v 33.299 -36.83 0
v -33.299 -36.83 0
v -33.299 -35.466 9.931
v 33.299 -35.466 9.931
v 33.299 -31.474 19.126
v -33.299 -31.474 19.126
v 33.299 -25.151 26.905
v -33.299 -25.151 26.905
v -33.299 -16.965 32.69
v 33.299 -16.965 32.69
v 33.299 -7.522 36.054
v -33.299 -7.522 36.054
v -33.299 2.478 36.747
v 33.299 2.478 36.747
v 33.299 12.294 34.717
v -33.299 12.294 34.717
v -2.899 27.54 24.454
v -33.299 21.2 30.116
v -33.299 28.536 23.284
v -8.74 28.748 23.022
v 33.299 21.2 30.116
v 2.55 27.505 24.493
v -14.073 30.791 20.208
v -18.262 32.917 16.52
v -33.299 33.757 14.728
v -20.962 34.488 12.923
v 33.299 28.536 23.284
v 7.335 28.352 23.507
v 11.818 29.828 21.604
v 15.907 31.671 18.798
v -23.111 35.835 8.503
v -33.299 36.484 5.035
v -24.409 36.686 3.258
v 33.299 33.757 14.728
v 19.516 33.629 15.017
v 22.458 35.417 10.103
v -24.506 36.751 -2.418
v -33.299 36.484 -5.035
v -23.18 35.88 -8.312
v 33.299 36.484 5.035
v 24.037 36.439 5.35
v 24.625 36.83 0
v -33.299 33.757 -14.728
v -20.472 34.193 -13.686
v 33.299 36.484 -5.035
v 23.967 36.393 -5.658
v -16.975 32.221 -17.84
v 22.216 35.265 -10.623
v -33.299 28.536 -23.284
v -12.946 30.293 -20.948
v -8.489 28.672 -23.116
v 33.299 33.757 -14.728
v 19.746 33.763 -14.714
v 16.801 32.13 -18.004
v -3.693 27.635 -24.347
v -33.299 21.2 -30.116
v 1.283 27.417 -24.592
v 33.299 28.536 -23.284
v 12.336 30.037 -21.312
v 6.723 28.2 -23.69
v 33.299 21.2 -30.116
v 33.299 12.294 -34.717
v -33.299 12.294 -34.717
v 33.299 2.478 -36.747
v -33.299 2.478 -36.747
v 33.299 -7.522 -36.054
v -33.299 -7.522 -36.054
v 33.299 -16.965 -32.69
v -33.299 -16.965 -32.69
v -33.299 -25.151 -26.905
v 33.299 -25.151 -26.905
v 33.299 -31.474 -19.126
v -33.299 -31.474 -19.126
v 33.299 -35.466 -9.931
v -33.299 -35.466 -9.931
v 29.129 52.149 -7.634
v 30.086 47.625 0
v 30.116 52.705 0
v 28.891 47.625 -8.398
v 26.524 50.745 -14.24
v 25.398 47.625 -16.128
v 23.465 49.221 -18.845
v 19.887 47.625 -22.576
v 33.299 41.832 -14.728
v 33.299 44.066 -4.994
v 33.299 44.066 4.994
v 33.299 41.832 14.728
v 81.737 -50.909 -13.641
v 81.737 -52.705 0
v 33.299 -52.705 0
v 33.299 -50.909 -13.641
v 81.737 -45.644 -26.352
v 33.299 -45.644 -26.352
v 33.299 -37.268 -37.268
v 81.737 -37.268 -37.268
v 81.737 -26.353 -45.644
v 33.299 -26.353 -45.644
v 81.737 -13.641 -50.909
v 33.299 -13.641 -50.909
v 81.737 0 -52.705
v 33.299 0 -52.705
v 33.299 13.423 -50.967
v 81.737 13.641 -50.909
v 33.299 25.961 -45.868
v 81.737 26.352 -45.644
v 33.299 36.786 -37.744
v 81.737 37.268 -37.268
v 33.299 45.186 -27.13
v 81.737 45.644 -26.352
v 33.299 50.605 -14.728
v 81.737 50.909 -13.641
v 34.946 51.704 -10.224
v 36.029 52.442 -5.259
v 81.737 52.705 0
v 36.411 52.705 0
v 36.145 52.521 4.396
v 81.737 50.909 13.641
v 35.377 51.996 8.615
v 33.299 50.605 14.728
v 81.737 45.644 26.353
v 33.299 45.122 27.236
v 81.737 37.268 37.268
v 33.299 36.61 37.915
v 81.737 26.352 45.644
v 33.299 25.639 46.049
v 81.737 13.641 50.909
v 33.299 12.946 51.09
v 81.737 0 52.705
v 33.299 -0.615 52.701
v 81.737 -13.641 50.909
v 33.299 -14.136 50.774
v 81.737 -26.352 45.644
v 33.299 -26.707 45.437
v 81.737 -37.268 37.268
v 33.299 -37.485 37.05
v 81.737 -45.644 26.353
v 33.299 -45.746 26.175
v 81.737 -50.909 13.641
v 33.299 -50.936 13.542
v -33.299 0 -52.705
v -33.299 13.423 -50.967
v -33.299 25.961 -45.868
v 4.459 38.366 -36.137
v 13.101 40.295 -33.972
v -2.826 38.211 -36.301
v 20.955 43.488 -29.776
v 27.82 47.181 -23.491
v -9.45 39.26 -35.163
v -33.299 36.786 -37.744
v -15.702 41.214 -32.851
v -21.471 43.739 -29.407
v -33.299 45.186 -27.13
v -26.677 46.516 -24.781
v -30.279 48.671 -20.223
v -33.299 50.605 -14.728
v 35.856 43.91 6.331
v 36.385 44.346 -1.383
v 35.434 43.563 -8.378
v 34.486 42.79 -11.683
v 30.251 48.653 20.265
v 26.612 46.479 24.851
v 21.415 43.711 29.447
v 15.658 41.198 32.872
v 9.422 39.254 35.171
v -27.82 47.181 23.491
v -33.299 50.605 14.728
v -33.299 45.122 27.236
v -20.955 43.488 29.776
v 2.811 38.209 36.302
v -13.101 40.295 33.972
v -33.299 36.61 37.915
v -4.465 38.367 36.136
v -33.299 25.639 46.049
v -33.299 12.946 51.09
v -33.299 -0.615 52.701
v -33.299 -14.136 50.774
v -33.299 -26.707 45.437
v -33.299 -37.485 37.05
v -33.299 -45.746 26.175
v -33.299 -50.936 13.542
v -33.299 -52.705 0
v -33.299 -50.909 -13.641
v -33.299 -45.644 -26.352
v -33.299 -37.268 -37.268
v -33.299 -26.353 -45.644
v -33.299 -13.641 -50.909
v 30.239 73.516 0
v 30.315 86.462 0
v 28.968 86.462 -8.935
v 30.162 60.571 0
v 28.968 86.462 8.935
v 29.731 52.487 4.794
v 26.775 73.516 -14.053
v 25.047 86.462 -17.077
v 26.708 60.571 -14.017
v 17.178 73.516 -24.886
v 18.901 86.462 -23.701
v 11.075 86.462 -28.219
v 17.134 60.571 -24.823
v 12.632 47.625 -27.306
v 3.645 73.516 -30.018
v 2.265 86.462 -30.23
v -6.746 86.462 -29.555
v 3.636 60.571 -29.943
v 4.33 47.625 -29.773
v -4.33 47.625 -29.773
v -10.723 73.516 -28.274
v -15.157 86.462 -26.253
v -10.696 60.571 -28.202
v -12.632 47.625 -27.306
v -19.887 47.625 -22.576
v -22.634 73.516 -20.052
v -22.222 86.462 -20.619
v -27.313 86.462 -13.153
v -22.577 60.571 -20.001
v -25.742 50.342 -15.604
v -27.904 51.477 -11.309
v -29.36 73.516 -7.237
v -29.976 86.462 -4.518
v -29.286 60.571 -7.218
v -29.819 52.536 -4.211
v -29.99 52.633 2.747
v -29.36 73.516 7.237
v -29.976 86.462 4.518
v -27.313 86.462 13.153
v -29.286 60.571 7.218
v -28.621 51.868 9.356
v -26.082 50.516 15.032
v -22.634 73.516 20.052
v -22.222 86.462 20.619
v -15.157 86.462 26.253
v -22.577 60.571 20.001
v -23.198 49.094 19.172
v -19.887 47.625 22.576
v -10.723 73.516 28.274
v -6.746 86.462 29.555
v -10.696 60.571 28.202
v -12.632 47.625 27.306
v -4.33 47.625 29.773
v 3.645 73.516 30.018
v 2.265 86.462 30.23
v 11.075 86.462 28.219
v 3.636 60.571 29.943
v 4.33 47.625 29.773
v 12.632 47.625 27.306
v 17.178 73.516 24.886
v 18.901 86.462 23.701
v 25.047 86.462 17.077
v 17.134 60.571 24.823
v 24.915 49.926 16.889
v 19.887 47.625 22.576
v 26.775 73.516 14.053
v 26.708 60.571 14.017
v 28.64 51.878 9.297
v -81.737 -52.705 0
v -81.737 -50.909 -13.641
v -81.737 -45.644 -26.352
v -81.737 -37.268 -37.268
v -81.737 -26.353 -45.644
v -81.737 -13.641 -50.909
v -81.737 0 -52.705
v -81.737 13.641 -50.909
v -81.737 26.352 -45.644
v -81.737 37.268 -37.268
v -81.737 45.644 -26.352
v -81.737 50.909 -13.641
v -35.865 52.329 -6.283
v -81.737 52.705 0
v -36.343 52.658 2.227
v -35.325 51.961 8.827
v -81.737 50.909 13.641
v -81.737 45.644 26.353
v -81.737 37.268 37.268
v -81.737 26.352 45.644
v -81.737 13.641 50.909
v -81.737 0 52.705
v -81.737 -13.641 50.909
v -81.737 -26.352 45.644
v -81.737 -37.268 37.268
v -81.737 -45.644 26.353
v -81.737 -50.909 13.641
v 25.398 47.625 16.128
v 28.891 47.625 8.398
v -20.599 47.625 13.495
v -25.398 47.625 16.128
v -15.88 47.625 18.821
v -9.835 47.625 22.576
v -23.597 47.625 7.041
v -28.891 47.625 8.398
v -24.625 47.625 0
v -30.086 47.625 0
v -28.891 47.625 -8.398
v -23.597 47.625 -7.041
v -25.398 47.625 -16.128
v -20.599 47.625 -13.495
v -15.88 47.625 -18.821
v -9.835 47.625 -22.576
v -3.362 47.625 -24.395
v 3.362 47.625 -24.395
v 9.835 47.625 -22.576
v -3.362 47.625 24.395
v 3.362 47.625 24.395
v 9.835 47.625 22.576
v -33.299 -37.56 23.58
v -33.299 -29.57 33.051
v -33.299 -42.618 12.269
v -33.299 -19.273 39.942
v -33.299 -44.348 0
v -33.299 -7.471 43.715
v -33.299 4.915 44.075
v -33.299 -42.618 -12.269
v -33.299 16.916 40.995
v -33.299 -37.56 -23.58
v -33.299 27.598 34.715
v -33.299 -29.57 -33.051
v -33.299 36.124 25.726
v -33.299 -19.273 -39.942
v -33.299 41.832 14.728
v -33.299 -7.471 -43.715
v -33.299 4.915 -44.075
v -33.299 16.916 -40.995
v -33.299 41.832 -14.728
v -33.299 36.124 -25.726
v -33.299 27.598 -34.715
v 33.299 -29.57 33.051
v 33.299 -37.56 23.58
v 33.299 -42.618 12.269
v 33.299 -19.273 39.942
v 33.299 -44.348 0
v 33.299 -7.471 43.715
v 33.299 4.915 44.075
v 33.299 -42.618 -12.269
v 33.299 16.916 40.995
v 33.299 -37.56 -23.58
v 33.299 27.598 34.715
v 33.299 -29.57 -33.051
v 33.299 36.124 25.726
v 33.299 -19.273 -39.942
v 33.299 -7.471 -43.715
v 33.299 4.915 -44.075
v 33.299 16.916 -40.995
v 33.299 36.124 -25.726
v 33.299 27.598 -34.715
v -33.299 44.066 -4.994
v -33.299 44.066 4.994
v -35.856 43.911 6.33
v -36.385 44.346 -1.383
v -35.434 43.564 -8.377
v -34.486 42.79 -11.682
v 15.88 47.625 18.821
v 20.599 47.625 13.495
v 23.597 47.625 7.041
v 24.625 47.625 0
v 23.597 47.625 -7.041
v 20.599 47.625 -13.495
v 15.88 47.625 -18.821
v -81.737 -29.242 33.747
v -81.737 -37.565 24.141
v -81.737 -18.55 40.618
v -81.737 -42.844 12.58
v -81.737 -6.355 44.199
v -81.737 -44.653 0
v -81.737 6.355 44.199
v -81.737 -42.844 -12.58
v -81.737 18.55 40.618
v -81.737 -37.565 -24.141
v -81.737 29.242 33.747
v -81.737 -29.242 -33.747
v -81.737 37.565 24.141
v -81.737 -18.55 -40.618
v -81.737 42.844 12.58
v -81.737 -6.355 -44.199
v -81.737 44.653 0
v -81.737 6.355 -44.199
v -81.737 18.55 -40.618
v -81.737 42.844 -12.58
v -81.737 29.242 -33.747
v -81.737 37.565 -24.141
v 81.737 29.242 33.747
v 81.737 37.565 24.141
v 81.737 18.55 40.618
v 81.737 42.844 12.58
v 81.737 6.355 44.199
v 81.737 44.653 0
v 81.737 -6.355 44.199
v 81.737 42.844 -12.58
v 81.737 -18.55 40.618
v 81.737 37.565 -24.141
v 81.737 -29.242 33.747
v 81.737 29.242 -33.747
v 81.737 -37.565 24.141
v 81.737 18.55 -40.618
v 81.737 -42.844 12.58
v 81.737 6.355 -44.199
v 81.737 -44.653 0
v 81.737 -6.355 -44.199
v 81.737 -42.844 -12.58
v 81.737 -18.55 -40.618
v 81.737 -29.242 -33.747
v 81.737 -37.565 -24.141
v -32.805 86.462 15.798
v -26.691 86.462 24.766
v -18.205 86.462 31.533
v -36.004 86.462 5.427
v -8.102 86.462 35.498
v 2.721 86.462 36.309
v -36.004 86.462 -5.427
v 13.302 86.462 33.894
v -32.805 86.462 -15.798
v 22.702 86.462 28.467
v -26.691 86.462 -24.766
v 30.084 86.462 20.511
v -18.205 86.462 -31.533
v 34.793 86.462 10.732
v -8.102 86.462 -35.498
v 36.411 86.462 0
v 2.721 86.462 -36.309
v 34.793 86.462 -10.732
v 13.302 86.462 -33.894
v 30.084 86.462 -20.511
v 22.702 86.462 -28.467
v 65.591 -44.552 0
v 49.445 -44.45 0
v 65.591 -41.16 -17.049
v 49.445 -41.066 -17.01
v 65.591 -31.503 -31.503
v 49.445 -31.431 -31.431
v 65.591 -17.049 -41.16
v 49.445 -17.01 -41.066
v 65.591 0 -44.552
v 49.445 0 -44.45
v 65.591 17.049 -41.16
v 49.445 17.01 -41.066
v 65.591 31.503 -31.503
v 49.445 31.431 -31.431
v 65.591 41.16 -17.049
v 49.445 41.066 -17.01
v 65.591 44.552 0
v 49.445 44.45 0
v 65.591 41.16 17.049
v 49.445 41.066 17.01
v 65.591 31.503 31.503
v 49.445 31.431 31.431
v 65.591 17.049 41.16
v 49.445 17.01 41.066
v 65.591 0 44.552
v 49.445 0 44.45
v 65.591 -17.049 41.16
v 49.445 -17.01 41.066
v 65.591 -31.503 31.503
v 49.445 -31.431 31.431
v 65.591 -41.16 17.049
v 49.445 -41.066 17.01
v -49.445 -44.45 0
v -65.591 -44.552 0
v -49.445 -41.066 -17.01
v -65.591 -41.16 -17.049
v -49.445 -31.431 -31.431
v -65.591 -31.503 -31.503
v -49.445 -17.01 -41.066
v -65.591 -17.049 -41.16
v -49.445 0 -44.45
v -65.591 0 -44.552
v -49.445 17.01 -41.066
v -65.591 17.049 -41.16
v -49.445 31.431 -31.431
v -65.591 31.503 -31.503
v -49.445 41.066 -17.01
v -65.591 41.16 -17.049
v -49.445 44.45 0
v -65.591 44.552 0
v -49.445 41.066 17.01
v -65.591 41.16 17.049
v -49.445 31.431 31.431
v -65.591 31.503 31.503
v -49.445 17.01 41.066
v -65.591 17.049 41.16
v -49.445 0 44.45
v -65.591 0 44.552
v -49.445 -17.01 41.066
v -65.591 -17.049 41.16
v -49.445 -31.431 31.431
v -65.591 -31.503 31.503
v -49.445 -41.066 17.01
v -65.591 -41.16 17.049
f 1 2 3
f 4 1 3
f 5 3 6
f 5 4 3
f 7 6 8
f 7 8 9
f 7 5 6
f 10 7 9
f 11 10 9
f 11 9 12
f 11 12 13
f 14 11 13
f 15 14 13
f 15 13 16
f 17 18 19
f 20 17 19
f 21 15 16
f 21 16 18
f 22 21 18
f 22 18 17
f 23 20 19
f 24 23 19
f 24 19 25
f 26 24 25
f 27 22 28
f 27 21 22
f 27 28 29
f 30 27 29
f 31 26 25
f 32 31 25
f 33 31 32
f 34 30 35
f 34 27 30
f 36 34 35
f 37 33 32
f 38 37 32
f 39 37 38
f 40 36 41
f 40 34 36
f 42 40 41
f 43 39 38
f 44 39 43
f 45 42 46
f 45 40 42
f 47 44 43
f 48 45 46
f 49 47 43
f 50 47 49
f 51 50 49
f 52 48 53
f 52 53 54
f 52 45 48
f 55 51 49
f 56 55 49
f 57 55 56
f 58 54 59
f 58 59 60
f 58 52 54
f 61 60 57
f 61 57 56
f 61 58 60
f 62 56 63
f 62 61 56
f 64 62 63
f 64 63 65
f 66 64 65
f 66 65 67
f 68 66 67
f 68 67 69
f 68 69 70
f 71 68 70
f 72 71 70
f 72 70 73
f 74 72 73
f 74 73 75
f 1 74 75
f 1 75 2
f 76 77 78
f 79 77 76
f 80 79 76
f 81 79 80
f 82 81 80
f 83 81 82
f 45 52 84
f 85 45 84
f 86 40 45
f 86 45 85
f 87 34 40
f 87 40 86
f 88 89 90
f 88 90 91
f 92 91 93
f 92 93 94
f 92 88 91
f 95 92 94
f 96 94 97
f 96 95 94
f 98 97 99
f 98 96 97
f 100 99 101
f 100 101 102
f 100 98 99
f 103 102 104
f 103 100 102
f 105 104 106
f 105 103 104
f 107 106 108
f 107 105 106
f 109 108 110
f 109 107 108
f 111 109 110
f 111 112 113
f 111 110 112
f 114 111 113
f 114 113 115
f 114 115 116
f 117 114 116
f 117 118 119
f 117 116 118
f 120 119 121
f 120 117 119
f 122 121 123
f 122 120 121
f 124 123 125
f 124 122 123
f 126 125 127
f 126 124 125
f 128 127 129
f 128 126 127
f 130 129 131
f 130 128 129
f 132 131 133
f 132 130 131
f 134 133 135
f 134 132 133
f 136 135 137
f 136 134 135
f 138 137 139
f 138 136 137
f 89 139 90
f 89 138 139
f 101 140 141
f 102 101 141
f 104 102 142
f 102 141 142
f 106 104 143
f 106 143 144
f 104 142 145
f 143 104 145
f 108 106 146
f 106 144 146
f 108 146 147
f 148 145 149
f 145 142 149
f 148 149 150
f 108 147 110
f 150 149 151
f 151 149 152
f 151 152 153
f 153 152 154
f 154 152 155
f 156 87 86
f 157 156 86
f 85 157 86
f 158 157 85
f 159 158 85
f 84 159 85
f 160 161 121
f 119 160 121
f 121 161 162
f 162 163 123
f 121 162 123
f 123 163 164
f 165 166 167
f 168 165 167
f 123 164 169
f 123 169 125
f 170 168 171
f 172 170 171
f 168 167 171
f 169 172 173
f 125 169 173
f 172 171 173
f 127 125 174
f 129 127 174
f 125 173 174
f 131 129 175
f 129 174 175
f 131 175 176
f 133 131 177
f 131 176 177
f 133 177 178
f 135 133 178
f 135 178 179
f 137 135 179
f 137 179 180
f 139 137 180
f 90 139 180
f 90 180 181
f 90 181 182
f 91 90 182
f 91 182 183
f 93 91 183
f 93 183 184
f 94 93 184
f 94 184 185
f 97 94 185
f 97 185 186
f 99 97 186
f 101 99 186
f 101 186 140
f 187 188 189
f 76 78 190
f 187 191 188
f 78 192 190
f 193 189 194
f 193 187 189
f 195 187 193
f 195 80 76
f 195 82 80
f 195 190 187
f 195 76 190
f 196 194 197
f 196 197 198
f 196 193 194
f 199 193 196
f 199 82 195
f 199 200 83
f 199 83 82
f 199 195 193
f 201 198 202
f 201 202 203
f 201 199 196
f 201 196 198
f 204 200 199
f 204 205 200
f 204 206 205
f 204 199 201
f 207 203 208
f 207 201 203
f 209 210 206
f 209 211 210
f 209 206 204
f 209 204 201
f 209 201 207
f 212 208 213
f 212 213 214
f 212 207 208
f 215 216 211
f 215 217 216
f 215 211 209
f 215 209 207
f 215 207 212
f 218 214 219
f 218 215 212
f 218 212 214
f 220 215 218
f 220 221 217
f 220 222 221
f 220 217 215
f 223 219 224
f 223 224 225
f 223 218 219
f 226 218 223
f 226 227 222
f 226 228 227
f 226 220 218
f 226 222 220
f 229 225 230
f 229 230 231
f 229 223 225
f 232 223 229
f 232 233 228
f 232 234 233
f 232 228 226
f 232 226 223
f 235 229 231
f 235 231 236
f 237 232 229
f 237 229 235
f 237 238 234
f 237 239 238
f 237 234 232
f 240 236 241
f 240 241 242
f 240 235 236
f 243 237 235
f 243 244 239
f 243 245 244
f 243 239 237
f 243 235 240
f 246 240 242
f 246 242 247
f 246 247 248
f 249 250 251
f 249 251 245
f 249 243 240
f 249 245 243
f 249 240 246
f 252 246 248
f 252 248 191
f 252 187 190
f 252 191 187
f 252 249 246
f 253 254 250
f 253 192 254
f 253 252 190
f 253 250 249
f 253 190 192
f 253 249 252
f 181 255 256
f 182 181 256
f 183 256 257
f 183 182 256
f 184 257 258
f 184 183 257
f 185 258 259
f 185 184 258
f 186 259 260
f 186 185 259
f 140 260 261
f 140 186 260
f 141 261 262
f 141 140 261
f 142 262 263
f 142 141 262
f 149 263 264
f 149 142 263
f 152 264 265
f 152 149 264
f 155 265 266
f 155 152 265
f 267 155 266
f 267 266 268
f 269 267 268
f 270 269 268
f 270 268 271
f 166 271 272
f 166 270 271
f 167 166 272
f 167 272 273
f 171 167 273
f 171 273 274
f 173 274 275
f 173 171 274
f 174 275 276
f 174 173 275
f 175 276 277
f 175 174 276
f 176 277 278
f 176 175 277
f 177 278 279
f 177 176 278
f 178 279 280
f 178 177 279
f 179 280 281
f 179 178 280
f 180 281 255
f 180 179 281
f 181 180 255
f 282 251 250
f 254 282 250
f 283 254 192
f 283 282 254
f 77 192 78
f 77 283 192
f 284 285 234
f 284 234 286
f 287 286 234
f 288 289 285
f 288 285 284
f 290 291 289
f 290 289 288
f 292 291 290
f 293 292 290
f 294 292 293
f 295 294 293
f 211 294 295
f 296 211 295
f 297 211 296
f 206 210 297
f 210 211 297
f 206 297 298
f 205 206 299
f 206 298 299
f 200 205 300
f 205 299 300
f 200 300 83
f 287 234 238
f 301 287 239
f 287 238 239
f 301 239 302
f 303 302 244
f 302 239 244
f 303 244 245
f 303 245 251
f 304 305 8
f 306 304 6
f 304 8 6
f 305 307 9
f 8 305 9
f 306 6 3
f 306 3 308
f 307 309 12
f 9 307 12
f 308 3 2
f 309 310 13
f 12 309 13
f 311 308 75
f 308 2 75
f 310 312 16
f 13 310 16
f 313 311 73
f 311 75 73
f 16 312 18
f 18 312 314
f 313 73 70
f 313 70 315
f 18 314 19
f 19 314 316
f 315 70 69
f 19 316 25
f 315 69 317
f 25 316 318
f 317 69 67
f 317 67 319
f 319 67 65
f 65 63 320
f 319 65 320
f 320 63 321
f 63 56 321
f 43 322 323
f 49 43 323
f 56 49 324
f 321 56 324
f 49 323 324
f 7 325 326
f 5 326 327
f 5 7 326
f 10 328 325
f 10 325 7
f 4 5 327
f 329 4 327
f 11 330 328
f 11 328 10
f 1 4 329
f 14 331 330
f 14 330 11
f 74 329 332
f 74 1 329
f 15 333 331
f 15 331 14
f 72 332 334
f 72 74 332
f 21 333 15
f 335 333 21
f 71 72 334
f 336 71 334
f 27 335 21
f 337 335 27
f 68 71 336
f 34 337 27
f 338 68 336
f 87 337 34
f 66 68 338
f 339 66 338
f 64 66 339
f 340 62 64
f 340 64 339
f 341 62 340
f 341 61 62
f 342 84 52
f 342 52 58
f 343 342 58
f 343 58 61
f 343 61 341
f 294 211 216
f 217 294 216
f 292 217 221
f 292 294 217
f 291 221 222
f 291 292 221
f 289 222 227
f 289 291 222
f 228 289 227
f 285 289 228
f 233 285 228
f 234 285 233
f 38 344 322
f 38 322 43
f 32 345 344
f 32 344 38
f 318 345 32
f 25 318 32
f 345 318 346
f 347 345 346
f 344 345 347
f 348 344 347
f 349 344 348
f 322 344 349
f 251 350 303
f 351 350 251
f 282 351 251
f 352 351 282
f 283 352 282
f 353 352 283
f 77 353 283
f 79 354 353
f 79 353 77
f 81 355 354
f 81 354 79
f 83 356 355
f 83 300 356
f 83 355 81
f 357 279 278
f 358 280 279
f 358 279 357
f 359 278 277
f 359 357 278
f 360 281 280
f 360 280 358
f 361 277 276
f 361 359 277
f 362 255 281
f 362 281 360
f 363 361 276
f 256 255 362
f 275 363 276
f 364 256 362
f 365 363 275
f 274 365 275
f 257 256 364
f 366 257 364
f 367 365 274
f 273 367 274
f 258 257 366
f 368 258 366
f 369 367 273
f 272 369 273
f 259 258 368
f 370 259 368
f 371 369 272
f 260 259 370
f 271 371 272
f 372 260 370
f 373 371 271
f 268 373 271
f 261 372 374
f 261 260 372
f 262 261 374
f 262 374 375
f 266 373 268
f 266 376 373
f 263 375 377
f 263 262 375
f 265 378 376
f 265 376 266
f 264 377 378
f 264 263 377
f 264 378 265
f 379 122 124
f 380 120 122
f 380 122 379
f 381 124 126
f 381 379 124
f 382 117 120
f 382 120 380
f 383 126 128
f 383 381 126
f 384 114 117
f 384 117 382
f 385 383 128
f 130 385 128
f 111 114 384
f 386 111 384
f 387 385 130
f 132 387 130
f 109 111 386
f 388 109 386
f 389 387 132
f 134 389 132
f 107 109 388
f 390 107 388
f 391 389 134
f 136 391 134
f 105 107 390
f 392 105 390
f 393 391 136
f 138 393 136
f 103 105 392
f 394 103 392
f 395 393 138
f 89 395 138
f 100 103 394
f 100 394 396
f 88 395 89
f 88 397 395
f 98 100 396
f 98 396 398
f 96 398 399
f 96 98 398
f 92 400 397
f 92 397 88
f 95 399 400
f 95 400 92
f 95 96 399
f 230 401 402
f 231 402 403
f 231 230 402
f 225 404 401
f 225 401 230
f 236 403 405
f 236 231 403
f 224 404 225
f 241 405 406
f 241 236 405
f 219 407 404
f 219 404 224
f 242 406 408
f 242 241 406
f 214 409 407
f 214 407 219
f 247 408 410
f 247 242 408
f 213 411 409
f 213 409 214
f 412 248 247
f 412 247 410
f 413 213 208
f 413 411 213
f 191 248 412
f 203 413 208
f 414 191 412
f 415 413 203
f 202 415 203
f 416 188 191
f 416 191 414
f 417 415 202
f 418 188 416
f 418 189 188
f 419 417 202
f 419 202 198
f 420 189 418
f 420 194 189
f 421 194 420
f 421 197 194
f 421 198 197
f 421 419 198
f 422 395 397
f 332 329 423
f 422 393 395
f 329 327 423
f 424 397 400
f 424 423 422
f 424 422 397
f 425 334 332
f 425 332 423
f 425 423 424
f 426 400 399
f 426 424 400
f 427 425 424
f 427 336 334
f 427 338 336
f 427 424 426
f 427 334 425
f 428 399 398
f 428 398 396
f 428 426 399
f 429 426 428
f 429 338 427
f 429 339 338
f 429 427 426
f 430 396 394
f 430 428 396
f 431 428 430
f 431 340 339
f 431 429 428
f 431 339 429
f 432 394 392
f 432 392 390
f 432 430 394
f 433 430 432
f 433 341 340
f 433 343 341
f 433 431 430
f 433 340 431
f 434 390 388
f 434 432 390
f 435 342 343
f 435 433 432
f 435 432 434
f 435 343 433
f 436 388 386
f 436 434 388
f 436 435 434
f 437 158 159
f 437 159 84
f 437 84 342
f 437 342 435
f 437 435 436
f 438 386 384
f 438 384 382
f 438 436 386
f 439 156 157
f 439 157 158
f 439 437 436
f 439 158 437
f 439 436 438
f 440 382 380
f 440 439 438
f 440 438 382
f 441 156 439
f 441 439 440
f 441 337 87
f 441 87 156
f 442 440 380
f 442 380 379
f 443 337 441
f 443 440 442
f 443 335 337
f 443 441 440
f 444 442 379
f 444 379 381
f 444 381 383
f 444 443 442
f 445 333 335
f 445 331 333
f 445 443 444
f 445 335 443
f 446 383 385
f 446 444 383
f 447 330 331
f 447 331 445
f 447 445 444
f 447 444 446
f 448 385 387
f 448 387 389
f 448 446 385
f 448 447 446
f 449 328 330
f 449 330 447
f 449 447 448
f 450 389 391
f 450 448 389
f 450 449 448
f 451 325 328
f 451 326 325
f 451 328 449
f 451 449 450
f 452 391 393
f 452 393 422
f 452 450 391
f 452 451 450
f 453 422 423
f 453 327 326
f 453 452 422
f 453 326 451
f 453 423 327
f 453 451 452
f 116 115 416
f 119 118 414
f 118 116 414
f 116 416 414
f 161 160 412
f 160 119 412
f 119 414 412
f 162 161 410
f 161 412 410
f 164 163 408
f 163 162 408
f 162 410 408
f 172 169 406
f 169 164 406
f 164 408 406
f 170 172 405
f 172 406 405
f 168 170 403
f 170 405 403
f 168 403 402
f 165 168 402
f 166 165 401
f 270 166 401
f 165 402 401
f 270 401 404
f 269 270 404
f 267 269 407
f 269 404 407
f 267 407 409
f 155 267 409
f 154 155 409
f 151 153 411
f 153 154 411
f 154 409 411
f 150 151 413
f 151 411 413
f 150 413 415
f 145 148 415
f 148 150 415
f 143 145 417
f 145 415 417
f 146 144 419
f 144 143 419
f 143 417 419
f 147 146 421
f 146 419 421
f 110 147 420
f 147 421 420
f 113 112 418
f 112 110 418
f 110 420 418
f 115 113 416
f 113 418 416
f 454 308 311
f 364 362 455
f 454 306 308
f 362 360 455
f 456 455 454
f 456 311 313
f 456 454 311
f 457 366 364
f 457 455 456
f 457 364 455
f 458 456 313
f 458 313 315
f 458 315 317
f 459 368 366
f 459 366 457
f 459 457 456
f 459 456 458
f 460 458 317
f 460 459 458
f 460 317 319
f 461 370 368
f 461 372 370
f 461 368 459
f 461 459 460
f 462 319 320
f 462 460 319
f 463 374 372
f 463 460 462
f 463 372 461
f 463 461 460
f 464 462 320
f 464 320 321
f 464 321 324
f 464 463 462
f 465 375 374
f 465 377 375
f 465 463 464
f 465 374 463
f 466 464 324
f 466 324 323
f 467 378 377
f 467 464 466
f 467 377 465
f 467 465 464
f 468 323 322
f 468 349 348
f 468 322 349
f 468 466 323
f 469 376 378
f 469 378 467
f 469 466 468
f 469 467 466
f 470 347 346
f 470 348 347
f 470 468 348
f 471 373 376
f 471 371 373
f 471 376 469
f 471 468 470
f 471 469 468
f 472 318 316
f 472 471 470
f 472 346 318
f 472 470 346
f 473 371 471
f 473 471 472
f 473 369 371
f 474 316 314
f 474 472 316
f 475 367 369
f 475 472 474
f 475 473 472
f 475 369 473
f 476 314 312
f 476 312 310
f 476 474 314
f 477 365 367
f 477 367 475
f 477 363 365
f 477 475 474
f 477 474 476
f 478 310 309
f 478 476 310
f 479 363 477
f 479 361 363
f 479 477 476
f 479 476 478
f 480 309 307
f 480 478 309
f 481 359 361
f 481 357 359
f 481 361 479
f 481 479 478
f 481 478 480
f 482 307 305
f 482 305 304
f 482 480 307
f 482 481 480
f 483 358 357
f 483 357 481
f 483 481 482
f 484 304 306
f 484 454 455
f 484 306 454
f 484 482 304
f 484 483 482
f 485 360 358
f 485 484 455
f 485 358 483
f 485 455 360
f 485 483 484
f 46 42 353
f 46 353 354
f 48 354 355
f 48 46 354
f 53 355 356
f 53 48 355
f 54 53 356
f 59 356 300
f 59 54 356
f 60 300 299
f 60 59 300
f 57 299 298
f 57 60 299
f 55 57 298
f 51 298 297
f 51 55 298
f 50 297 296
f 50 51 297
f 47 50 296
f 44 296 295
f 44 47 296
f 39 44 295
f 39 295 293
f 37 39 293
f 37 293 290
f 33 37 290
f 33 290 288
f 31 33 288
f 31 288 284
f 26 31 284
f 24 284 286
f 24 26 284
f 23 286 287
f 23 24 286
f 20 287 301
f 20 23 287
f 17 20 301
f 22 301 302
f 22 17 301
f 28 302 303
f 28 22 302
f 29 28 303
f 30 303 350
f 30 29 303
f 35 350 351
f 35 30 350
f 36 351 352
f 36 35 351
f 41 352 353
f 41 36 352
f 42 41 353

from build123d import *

# Parameters (mm, degrees)
SKETCH4_R           = 52.705
BOSS_EXTRUDE1_DEPTH = 66.5988
SKETCH5_R           = 36.4109
BOSS_EXTRUDE2_DEPTH = 47.625


with BuildPart() as part:
    # Sketch1 → Revolve1 (revolve)
    with BuildSketch(Plane.XY):
        Polygon((-81.7372, -52.705), (-33.2994, -52.705), (-33.2994, -44.3484), (-81.7372, -44.6532), align=None)
        Polygon((81.7372, -44.6532), (33.2994, -44.3484), (33.2994, -52.705), (81.7372, -52.705), align=None)
    revolve(axis=Axis((-81.7372, 0, 0), (1, 0, 0)))



with BuildPart() as body_2:
    # Sketch2 → Revolve2 (revolve)
    with BuildSketch(Plane.XY):
        Polygon((30.3149, 86.4616), (30.0863, 47.625), (36.4109, 47.625), (36.4109, 86.4616), align=None)
    revolve(axis=Axis((0, 0, 0), (0, 1, 0)))


with BuildPart() as part_1:
    add(part.part)

    add(body_2.part)  # Boss-Extrude1 merges body 2
    # Sketch4 → Boss-Extrude1 (add)
    with BuildSketch(Plane(origin=(-33.2994, 0, 0), x_dir=(0, 0, -1), z_dir=(1, 0, 0))):
        Circle(SKETCH4_R)
    extrude(amount=BOSS_EXTRUDE1_DEPTH)

    # Sketch5 → Boss-Extrude2 (add)
    with BuildSketch(Plane.XZ.offset(-47.625)):
        Circle(SKETCH5_R)
    extrude(amount=BOSS_EXTRUDE2_DEPTH)

    # Sketch6 → Cut-Revolve1 (revolve, cut)
    with BuildSketch(Plane.XY):
        Polygon((-81.7372, -44.6532), (-33.2994, -44.3484), (-33.2994, -36.83), (33.2994, -36.83), (33.2994, -44.3484), (81.7372, -44.6532), (81.7372, 0), (-81.7372, 0), align=None)
    revolve(axis=Axis((81.7372, 0, 0), (-1, 0, 0)), mode=Mode.SUBTRACT)

    # Sketch7 → Cut-Revolve2 (revolve, cut)
    with BuildSketch(Plane.XY):
        Polygon((30.3149, 86.4616), (30.0863, 47.625), (24.6253, 47.625), (24.6253, 0), (0, 0), (0, 86.4616), align=None)
    revolve(axis=Axis((0, 0, 0), (0, 1, 0)), mode=Mode.SUBTRACT)


solid = part_1.part
